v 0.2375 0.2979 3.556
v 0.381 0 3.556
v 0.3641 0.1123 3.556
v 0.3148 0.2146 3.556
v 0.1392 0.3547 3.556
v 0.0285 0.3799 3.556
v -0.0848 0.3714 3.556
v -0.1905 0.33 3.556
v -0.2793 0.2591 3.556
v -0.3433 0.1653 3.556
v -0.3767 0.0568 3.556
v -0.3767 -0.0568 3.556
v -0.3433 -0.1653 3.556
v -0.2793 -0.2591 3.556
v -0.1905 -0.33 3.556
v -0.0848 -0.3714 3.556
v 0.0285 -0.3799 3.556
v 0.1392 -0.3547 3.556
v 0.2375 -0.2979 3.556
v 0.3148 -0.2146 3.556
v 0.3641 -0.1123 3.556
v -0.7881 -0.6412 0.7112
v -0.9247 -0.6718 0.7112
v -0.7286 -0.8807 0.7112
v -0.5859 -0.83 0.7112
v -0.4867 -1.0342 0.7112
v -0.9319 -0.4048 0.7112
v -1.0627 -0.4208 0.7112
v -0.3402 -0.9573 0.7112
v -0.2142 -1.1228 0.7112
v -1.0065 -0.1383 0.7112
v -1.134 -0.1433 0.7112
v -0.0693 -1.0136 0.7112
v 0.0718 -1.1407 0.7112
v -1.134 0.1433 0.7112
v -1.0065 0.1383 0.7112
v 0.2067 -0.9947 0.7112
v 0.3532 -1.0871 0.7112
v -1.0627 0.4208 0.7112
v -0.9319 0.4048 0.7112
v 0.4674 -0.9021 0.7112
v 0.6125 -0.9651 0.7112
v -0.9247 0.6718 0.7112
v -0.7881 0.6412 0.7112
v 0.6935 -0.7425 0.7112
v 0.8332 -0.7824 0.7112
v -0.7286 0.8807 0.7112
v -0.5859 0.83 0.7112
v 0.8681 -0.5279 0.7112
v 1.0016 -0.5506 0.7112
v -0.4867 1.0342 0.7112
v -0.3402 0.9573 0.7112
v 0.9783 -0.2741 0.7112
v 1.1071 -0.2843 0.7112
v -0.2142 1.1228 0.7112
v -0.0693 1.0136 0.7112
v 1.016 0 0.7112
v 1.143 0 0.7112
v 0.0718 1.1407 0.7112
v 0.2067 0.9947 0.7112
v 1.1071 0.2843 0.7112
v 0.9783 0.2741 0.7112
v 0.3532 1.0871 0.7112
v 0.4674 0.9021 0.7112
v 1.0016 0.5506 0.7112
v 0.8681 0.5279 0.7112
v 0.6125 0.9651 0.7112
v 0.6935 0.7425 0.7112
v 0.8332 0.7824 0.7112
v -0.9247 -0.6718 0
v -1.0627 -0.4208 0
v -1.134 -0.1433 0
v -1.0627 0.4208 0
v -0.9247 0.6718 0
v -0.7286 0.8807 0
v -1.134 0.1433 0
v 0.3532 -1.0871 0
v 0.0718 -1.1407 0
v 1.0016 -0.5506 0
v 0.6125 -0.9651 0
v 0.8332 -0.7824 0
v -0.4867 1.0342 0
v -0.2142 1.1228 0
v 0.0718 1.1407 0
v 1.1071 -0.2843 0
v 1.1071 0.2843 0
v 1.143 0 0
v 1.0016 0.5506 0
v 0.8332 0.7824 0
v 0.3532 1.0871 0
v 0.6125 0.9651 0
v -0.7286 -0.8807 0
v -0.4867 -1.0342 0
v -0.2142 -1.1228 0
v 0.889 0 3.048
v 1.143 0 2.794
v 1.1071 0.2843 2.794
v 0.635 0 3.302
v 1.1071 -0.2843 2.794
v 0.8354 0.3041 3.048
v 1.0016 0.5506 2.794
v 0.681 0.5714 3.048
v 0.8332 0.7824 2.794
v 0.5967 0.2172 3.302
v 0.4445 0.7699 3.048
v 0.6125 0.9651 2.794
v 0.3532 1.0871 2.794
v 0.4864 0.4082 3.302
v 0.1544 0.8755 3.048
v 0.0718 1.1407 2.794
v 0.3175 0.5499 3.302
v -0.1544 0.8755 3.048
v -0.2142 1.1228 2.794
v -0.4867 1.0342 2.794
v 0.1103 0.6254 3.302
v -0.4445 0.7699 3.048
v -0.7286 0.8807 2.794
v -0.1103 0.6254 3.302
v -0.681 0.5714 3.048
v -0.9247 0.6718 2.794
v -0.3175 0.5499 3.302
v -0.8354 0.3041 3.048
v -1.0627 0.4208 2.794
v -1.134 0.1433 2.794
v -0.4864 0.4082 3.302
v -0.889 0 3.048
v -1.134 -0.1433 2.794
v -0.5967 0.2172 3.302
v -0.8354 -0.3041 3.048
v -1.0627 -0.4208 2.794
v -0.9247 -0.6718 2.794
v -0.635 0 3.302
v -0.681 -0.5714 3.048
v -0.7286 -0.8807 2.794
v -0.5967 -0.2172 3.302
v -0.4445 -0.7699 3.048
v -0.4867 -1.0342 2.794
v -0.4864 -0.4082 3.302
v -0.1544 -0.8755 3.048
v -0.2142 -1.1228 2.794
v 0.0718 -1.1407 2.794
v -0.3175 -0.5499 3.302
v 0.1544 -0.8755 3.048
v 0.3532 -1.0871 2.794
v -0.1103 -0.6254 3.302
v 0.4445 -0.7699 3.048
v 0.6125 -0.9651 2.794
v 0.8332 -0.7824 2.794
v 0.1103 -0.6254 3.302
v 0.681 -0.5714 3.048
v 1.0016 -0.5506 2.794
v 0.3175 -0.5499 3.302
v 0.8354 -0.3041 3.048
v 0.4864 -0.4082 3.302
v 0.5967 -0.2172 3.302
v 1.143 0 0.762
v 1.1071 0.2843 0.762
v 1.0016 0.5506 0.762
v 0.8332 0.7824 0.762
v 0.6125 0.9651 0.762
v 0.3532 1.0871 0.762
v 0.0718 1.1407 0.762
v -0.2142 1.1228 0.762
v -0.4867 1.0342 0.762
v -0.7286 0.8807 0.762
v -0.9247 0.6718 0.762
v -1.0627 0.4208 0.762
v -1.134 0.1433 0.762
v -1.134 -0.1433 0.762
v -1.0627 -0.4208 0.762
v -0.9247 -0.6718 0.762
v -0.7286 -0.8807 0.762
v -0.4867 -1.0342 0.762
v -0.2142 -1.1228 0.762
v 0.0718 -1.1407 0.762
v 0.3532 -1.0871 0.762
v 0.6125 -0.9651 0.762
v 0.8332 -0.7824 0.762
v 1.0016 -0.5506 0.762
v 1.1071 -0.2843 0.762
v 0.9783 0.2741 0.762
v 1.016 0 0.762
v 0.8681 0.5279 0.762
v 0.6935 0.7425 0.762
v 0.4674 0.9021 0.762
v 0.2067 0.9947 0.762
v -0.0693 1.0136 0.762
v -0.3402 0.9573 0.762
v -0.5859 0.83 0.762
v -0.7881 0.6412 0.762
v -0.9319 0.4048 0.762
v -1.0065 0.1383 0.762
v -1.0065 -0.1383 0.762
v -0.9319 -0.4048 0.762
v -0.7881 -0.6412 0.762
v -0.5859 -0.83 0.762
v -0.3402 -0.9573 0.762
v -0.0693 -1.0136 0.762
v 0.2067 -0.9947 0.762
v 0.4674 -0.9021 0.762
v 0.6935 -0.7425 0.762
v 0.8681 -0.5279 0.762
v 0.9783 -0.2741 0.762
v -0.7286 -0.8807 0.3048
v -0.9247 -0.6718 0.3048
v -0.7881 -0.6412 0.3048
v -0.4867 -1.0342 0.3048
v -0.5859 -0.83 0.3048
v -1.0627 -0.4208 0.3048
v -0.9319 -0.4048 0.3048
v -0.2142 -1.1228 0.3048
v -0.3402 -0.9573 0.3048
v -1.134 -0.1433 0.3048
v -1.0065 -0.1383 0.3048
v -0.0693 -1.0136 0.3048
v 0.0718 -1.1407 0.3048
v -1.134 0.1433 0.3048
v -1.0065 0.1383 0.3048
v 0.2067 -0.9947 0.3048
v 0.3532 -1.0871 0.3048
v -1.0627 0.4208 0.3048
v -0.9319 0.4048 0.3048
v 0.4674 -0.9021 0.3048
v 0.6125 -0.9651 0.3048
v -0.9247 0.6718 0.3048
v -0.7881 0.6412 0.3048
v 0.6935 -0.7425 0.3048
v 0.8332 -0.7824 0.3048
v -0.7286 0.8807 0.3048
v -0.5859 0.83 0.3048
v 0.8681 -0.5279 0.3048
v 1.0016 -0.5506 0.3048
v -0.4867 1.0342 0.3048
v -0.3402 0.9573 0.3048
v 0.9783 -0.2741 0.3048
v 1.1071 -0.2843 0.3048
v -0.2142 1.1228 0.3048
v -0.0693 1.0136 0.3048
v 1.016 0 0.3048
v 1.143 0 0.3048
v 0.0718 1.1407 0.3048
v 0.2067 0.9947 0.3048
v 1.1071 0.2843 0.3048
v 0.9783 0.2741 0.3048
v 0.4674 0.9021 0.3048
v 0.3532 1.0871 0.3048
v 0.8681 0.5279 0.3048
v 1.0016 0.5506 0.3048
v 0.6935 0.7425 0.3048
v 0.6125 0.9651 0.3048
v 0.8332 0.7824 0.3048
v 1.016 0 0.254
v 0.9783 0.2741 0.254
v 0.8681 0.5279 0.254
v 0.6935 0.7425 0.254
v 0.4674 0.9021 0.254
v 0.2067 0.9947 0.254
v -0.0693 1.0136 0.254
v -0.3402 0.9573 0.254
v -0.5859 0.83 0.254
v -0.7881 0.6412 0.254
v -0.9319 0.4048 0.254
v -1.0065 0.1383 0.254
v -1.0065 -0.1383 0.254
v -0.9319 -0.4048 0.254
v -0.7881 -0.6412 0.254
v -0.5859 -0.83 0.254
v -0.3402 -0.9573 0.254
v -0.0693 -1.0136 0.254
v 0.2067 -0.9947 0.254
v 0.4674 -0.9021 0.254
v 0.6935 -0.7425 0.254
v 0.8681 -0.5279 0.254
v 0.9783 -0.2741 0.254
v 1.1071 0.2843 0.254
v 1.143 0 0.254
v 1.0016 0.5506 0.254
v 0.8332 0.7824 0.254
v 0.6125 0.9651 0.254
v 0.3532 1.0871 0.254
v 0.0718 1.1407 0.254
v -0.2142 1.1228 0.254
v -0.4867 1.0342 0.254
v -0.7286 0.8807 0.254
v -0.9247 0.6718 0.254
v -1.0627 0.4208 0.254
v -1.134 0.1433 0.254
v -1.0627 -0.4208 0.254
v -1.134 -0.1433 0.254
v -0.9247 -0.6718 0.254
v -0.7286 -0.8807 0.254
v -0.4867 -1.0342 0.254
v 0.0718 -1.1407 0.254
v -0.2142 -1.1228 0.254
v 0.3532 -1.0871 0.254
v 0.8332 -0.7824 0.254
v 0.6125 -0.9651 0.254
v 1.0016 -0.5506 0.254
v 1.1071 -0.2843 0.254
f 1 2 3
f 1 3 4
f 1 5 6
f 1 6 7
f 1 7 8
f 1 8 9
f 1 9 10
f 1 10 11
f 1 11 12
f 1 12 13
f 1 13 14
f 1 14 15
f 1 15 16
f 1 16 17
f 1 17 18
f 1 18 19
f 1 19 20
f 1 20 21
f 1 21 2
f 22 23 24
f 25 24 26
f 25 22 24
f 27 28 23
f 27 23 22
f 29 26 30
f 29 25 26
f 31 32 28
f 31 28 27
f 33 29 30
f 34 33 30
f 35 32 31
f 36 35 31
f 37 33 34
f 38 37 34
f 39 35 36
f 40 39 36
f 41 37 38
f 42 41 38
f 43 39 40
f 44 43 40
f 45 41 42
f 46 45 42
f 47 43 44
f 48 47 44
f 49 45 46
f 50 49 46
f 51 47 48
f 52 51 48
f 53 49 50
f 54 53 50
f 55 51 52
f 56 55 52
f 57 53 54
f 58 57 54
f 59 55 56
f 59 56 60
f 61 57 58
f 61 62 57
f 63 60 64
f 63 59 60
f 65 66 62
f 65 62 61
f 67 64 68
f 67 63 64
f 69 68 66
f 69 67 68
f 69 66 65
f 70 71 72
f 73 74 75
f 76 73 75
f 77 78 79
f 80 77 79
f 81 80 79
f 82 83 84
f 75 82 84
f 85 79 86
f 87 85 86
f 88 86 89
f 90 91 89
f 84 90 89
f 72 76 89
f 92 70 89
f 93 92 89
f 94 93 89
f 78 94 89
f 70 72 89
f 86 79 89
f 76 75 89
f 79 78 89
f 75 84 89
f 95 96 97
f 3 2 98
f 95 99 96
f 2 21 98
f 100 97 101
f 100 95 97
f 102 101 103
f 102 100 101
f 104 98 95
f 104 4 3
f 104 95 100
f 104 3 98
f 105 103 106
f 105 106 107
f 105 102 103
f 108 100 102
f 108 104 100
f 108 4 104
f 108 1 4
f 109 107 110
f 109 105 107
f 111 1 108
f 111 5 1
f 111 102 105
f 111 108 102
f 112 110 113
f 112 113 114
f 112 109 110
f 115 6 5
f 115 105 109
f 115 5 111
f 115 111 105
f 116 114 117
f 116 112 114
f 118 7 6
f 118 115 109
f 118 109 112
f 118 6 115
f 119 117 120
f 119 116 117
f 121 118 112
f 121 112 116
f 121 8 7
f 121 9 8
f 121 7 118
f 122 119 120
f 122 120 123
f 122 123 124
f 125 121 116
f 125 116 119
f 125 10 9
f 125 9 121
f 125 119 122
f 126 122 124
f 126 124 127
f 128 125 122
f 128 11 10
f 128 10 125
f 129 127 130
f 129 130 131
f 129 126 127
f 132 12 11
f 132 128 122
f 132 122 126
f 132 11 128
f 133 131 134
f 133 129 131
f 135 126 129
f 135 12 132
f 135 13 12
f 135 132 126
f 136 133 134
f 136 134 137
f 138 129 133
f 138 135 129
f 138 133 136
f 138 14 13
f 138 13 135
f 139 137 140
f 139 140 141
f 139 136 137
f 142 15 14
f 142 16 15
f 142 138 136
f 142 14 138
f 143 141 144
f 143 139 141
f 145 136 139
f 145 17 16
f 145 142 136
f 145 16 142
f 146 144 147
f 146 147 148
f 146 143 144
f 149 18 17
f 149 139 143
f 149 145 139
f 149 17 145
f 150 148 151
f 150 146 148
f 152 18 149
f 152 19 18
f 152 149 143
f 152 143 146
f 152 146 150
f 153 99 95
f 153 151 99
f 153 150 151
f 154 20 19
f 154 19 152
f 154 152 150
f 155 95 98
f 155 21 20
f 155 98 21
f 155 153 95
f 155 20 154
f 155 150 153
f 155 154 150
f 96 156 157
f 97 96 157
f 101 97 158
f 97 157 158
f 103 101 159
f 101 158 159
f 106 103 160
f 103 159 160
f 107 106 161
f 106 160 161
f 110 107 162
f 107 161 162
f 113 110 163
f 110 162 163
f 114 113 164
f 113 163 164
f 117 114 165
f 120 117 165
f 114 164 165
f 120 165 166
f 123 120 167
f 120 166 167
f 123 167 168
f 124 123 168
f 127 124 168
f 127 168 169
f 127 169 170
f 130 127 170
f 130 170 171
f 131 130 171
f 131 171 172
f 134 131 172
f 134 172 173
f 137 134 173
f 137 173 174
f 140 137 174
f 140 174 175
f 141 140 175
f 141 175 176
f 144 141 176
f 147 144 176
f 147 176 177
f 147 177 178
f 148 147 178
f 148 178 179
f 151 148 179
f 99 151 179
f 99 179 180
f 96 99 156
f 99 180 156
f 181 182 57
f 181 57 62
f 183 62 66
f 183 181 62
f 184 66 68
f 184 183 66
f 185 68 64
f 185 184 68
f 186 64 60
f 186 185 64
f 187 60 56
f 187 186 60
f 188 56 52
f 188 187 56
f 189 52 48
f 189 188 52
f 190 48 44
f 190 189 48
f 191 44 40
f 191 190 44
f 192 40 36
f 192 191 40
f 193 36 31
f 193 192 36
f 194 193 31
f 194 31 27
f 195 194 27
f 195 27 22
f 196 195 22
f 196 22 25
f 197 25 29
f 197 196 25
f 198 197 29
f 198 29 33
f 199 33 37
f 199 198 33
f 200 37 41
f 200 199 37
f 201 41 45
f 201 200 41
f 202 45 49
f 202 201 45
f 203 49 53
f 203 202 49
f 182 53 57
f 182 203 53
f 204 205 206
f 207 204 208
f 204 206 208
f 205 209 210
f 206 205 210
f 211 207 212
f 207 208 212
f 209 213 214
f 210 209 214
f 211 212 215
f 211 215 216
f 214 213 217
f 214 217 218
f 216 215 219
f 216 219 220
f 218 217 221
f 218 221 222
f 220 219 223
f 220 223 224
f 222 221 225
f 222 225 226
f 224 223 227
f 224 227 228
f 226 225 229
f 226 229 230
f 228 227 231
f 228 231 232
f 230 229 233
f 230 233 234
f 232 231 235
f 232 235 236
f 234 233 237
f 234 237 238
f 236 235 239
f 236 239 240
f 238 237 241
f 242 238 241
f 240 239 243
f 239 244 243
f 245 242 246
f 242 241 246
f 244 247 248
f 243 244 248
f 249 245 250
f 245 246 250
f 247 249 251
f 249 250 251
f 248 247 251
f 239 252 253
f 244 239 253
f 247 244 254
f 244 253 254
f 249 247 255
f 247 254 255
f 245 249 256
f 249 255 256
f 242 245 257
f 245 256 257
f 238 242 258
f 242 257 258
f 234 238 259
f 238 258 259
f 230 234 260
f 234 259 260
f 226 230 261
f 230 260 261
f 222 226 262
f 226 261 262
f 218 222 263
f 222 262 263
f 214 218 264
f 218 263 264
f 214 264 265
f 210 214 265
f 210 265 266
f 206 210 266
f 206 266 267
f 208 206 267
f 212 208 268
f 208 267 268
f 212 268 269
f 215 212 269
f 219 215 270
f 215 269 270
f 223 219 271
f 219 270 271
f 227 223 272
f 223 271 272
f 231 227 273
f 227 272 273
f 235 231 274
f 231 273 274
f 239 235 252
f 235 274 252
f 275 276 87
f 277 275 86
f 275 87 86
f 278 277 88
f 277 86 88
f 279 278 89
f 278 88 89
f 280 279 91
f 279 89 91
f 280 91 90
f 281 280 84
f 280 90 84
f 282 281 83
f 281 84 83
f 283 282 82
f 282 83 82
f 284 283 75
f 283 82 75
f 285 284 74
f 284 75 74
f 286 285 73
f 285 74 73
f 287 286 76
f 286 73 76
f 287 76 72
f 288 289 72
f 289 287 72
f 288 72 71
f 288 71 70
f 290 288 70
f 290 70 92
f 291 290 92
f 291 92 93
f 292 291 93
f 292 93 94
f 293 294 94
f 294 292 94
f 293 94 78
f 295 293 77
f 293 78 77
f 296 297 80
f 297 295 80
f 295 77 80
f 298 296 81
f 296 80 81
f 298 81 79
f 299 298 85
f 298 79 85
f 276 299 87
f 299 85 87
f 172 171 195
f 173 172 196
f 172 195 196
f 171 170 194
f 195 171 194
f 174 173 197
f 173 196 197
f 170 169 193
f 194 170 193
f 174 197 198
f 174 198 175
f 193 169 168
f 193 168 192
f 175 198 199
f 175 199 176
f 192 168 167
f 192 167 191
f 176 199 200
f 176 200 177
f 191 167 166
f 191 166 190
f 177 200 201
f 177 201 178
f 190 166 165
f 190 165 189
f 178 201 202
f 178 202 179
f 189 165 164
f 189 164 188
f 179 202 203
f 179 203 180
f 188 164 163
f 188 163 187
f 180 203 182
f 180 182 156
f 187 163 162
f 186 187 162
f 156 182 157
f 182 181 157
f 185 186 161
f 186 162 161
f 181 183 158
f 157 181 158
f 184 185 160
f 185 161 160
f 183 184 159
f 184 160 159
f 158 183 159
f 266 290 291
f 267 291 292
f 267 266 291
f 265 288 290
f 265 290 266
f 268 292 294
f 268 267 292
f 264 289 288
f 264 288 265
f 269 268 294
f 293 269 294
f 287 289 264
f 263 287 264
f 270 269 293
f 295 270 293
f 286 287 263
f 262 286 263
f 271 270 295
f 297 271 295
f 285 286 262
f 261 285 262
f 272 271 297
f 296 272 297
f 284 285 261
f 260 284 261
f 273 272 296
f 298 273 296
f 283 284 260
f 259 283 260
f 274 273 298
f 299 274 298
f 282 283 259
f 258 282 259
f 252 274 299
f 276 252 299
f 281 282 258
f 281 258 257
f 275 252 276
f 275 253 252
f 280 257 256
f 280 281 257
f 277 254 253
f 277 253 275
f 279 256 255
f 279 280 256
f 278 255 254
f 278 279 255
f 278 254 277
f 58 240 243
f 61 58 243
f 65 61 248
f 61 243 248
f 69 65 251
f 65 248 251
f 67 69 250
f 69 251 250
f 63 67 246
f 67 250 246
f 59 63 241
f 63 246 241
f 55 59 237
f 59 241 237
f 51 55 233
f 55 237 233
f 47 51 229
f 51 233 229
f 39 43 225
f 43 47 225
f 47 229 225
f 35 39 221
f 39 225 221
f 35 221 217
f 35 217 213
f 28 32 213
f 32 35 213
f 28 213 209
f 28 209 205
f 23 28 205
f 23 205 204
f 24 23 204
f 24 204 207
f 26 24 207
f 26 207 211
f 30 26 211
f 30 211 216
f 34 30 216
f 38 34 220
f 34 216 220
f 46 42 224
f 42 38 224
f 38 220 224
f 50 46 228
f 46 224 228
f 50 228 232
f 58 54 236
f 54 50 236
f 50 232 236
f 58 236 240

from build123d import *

# Parameters (mm, degrees)
F0_R     = 1.143
F1_DEPTH = 3.556
F4_R     = 1.1557
F4_R_2   = 1.016
F5_DEPTH = 0.0508
F6_R     = 1.1557
F6_R_2   = 1.016
F7_DEPTH = 0.0508
F8_SIZE  = 0.762


with BuildPart() as f1:
    # F0 (on Top) → F1 (new body)
    with BuildSketch(Plane.XY):
        Circle(F0_R)
    extrude(amount=F1_DEPTH)

    # F4 (on offset) → F5 (cut)
    with BuildSketch(Plane.XY.offset(0.254)):
        Circle(F4_R)
        Circle(F4_R_2, mode=Mode.SUBTRACT)
    extrude(amount=F5_DEPTH, mode=Mode.SUBTRACT)

    # F6 (on offset) → F7 (cut)
    with BuildSketch(Plane.XY.offset(0.762)):
        Circle(F6_R)
        Circle(F6_R_2, mode=Mode.SUBTRACT)
    extrude(amount=-F7_DEPTH, mode=Mode.SUBTRACT)

    # F8
    f8_edges = [f1.edges().sort_by_distance(p)[0] for p in [
        (-1.143, 0, 3.556),
    ]]
    chamfer(f8_edges, length=F8_SIZE)


solid = f1.part
